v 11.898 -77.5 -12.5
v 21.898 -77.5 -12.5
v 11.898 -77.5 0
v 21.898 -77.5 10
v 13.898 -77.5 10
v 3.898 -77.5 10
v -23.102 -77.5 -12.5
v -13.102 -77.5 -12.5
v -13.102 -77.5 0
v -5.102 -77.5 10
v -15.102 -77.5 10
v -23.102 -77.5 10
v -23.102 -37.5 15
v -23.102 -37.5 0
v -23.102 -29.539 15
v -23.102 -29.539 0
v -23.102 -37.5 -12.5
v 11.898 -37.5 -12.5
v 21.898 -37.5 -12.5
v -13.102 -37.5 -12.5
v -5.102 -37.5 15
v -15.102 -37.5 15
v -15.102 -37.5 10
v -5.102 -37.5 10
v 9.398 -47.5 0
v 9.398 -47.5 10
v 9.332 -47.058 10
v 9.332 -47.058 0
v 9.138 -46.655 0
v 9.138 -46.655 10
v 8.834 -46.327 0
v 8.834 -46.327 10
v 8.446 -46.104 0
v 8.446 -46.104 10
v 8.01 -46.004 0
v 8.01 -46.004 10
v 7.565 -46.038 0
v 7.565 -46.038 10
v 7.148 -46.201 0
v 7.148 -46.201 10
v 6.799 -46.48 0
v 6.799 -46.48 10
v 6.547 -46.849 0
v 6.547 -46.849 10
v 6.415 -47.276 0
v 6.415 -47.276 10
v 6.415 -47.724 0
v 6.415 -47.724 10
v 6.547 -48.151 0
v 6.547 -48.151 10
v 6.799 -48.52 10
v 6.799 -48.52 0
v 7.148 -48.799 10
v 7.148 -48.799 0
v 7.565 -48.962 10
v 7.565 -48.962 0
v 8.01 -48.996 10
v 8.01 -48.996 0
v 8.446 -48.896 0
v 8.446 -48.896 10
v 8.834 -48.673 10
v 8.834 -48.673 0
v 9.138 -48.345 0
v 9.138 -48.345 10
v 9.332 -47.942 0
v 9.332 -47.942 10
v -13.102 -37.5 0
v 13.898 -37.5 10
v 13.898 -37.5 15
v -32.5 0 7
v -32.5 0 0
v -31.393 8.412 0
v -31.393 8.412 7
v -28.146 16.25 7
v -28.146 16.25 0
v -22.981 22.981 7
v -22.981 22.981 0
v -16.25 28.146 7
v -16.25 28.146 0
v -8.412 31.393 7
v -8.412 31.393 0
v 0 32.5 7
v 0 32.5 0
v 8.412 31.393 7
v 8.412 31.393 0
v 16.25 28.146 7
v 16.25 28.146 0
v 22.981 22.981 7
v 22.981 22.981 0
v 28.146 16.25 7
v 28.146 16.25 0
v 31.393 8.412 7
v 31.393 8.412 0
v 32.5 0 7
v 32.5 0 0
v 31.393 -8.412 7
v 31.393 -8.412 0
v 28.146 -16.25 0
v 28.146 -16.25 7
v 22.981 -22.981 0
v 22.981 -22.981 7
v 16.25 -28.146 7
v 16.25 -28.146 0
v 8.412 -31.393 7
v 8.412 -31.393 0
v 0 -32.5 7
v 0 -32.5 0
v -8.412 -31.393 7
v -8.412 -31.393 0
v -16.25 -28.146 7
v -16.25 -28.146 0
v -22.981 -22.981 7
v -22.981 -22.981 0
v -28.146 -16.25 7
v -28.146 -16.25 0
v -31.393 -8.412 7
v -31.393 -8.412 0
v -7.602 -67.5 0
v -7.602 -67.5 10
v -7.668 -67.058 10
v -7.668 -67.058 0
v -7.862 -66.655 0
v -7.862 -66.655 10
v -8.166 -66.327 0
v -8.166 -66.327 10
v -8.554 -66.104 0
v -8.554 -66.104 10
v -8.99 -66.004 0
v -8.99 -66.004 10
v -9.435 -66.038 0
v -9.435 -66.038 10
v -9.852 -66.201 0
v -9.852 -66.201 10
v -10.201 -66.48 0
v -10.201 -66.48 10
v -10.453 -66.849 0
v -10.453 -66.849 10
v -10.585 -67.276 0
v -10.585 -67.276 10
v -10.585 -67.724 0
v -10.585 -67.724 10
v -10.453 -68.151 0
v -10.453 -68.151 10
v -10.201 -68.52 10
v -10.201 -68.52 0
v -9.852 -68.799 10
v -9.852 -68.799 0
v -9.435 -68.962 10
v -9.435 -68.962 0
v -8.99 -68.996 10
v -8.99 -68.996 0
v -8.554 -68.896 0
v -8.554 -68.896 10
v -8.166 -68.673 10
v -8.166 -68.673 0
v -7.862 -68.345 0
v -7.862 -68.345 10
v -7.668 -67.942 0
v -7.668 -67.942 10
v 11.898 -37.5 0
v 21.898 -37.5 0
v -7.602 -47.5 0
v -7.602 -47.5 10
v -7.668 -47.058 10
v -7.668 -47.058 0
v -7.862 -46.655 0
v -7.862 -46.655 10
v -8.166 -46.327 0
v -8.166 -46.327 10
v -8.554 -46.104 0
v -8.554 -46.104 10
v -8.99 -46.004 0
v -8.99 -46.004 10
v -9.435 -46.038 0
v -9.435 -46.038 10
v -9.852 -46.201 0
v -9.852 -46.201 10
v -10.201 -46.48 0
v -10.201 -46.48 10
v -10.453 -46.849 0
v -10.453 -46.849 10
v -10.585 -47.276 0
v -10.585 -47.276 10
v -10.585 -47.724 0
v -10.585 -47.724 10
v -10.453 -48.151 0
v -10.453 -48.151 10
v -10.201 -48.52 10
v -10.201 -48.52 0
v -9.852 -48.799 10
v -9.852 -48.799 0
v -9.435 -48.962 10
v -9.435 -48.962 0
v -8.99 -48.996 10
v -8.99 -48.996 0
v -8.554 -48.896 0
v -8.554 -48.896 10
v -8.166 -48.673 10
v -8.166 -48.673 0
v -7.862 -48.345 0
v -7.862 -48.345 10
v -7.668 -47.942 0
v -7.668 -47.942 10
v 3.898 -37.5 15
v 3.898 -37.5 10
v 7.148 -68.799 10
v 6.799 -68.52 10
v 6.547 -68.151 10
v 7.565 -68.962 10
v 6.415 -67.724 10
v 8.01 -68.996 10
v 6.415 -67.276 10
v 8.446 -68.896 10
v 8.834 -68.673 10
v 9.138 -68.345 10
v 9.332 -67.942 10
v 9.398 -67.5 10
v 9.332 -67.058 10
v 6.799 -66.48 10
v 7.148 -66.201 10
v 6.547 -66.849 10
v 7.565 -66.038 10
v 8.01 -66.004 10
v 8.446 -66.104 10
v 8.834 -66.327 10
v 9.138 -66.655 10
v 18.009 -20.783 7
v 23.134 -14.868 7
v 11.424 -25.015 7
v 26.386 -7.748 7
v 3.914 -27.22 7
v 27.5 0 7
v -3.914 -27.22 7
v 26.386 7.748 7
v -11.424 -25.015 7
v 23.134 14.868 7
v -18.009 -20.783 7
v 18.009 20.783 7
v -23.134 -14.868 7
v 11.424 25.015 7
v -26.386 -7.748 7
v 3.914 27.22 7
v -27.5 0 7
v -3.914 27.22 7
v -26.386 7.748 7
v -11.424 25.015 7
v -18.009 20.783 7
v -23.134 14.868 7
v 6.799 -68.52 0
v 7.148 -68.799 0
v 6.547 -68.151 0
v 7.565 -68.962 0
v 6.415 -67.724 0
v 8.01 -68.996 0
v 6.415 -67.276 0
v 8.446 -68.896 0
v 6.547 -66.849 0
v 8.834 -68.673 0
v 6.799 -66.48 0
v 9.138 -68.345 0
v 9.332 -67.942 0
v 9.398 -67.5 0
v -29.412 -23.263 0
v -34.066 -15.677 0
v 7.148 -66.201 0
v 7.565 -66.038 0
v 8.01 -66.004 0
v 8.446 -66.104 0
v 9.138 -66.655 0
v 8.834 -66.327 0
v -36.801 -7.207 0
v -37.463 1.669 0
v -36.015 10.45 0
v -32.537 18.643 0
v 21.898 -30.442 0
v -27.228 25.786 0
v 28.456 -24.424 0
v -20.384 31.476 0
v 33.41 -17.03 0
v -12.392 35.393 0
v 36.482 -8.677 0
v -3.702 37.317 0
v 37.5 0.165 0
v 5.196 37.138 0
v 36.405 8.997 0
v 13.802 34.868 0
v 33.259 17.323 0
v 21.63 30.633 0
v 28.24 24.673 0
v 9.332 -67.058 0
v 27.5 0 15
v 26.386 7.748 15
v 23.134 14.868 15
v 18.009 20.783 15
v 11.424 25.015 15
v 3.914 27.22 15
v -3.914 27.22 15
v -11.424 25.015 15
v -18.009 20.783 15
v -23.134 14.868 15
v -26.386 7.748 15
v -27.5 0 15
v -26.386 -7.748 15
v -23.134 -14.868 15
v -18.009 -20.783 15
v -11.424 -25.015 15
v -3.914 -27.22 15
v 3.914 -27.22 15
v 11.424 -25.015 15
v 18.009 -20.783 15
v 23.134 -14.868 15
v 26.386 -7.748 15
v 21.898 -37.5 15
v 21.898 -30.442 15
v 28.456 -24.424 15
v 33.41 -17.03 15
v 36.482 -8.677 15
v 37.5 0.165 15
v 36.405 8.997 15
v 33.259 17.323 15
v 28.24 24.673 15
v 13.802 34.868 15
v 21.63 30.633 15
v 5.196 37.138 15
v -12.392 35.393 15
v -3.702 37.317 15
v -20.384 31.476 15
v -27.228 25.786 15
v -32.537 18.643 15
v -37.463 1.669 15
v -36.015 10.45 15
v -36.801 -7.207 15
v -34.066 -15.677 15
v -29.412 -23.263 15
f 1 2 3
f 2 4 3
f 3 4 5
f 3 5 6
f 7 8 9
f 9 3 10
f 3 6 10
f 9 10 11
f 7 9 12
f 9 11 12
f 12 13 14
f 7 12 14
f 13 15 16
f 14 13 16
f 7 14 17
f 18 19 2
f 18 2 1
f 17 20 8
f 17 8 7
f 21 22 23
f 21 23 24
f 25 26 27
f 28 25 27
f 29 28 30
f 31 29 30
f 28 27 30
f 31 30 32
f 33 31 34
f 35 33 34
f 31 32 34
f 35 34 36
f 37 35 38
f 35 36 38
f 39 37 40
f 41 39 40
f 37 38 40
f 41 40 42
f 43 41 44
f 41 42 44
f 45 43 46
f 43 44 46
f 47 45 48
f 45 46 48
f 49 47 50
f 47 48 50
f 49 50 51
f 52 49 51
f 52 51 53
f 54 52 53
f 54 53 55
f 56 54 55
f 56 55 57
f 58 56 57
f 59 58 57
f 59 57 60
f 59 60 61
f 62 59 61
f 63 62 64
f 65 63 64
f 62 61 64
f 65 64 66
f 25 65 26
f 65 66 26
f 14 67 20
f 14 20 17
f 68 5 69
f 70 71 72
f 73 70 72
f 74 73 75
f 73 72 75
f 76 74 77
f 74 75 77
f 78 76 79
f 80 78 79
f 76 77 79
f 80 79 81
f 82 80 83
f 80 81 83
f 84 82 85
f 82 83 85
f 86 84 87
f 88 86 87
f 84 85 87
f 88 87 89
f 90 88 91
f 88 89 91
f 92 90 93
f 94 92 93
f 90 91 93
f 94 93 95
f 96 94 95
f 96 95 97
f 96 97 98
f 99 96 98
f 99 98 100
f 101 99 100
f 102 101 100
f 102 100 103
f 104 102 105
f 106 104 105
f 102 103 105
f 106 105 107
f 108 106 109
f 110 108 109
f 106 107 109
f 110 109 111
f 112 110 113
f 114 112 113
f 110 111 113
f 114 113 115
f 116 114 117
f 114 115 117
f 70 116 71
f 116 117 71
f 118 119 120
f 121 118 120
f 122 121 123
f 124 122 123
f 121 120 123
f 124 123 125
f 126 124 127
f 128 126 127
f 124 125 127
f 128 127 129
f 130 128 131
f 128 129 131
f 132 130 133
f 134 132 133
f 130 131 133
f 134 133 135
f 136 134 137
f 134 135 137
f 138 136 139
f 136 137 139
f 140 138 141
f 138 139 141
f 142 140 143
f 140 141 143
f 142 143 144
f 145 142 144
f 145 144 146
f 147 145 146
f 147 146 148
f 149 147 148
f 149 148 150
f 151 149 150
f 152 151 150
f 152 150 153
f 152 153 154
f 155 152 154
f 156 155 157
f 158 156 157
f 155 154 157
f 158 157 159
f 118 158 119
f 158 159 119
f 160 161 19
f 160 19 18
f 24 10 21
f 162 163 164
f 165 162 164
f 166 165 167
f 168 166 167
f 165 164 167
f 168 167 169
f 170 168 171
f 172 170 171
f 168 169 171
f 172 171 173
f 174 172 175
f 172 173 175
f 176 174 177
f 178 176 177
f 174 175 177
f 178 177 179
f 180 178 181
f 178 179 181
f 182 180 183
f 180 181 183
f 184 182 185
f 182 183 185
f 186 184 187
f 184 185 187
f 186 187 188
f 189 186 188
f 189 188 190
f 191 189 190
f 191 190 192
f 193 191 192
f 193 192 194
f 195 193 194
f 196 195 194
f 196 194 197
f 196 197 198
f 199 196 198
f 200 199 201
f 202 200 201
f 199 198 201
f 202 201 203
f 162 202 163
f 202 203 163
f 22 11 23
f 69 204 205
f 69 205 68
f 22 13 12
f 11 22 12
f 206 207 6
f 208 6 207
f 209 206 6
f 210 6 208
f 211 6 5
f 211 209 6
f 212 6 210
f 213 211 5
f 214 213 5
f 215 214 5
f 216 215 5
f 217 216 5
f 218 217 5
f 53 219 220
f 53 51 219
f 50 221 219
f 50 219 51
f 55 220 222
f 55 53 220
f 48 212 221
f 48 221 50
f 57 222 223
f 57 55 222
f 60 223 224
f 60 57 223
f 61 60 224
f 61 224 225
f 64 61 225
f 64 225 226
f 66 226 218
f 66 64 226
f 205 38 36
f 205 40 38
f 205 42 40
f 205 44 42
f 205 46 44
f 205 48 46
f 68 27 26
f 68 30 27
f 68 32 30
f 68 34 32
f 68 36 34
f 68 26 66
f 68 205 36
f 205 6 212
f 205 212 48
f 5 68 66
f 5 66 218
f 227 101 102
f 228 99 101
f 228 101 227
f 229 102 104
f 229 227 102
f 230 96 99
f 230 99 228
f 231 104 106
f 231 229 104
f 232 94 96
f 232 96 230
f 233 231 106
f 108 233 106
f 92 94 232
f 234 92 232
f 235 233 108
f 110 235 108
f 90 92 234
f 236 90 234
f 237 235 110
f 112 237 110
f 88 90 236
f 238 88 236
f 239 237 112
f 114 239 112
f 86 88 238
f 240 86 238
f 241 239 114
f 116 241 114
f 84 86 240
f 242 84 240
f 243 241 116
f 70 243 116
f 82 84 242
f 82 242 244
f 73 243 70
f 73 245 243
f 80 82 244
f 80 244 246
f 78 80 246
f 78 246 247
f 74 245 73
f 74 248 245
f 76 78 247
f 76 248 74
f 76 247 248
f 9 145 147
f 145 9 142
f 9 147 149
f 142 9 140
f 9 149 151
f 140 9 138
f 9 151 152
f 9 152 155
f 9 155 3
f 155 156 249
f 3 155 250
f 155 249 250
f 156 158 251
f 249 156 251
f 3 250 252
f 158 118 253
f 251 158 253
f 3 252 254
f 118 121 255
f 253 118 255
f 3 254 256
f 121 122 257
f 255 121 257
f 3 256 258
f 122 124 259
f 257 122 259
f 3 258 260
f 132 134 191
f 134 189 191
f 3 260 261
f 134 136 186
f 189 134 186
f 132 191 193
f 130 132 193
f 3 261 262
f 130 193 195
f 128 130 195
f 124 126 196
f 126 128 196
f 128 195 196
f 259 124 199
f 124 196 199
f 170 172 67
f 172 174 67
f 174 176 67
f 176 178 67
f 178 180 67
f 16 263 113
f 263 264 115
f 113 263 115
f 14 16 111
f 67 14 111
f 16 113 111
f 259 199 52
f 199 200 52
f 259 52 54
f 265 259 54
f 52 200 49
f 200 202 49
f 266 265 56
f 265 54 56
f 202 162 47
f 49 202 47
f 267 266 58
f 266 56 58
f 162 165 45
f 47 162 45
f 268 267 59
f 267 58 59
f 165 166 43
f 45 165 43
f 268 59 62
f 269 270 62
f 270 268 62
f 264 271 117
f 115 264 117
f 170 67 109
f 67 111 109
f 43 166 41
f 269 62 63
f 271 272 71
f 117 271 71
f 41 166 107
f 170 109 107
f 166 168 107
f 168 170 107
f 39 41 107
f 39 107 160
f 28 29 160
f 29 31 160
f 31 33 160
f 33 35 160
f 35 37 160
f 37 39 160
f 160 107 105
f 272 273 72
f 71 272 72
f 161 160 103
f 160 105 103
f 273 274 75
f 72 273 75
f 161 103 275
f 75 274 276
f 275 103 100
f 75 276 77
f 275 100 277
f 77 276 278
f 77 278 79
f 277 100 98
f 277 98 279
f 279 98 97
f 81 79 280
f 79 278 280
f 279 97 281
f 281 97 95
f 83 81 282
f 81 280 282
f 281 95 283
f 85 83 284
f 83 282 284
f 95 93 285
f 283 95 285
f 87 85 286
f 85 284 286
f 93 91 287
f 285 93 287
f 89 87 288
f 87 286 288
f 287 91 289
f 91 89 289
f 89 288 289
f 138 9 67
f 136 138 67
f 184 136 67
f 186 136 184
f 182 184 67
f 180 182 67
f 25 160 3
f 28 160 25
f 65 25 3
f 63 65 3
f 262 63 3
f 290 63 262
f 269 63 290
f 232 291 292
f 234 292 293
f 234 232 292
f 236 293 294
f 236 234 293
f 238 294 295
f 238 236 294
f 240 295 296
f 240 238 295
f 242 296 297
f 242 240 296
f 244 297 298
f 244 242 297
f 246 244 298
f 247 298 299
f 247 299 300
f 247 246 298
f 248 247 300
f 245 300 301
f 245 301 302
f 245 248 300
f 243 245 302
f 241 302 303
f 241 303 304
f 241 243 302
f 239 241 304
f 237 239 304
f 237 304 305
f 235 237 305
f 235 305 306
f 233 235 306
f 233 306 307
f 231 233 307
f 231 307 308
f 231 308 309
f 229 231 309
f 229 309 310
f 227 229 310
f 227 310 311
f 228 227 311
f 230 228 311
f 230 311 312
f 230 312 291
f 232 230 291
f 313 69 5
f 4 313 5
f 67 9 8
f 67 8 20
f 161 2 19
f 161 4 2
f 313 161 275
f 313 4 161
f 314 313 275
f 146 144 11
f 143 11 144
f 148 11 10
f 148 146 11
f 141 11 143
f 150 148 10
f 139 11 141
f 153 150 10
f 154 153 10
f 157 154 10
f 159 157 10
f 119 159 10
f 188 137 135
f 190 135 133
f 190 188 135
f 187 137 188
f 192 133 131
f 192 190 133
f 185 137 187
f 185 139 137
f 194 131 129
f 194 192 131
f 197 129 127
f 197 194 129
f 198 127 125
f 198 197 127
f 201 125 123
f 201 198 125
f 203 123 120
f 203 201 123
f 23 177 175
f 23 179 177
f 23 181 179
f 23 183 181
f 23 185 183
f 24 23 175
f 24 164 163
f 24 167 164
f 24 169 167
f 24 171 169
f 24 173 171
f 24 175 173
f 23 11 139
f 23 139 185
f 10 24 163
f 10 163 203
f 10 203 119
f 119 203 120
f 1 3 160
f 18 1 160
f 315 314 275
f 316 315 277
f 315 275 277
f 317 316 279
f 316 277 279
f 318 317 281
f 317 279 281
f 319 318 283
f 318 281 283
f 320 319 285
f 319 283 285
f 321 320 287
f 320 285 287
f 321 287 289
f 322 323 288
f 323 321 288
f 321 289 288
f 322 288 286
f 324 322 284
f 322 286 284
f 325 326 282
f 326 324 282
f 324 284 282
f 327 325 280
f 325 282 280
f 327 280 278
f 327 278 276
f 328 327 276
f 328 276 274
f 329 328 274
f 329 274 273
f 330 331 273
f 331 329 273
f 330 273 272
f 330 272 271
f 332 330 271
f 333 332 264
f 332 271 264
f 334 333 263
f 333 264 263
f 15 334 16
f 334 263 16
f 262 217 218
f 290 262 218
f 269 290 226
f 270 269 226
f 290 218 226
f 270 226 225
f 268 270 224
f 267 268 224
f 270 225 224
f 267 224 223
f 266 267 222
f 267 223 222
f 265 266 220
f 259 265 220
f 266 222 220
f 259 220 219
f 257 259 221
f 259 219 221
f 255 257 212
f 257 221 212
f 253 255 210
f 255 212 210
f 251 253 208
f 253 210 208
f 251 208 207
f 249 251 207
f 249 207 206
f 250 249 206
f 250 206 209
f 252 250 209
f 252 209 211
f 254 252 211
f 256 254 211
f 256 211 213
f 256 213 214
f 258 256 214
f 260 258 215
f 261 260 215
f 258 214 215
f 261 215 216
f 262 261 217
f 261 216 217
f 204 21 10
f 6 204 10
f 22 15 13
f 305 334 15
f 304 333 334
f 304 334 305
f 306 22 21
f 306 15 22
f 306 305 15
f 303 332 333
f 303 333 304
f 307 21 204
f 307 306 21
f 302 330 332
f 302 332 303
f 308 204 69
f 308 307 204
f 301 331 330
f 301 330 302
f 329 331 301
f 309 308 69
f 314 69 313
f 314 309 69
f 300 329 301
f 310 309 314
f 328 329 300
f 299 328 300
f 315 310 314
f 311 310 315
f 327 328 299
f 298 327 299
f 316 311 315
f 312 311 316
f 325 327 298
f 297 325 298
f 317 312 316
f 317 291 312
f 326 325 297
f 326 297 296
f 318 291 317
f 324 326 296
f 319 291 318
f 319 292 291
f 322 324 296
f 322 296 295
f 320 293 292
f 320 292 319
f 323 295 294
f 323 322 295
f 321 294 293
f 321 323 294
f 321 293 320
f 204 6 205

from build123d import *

# Parameters (mm, degrees)
SKETCH1_R           = 27.5
BOSS_EXTRUDE1_DEPTH = 15
SKETCH2_R           = 32.5
SKETCH2_R_2         = 27.5
CUT_EXTRUDE1_DEPTH  = 7
SKETCH3_W           = 5
SKETCH3_H           = 40
CUT_EXTRUDE2_DEPTH  = 45
BOSS_EXTRUDE2_DEPTH = 45
SKETCH6_W           = 10
SKETCH6_H           = 40
CUT_EXTRUDE3_DEPTH  = 5
SKETCH7_W           = 10
SKETCH7_H           = 40
BOSS_EXTRUDE3_DEPTH = 12.5
SKETCH8_R           = 1.5
CUT_EXTRUDE4_DEPTH  = 10


with BuildPart() as part:
    # Sketch1 → Boss-Extrude1 (new body)
    with BuildSketch(Plane.XY):
        with BuildLine():
            Line((-23.101603537, -29.5392267), (-23.101603537, -77.5))
            Line((-23.101603537, -77.5), (21.898396463, -77.5))
            Line((21.898396463, -77.5), (21.898396463, -30.441915714))
            ThreePointArc((21.898396463, -30.441915714), (0.752089542, 37.492457392), (-23.101603537, -29.5392267))
        make_face()
        Circle(SKETCH1_R, mode=Mode.SUBTRACT)
    extrude(amount=BOSS_EXTRUDE1_DEPTH)

    # Sketch2 → Cut-Extrude1 (cut)
    with BuildSketch(Plane(origin=(0, 0, 0), x_dir=(-1, 0, 0), z_dir=(0, 0, -1))):
        Circle(SKETCH2_R)
        Circle(SKETCH2_R_2, mode=Mode.SUBTRACT)
    extrude(amount=-CUT_EXTRUDE1_DEPTH, mode=Mode.SUBTRACT)

    # Sketch3 → Cut-Extrude2 (cut)
    with BuildSketch(Plane(origin=(21.898396463, 0, 0), x_dir=(0, 0, -1), z_dir=(1, 0, 0))):
        with Locations((-12.5, -57.5)):
            Rectangle(SKETCH3_W, SKETCH3_H)
    extrude(amount=-CUT_EXTRUDE2_DEPTH, mode=Mode.SUBTRACT)

    # Sketch5 → Boss-Extrude2 (add)
    with BuildSketch(Plane.ZY.offset(23.101603537)):
        Polygon((10, -37.5), (15, -37.5), (10, -77.5), align=None)
    extrude(amount=-BOSS_EXTRUDE2_DEPTH)

    # Sketch6 → Cut-Extrude3 (cut)
    with BuildSketch(Plane.XY.offset(15)):
        with Locations((-10.101603537, -57.5)):
            Rectangle(SKETCH6_W, SKETCH6_H)
        with Locations((8.898396463, -57.5)):
            Rectangle(SKETCH6_W, SKETCH6_H)
    extrude(amount=-CUT_EXTRUDE3_DEPTH, mode=Mode.SUBTRACT)

    # Sketch7 → Boss-Extrude3 (add)
    with BuildSketch(Plane(origin=(0, 0, 0), x_dir=(-1, 0, 0), z_dir=(0, 0, -1))):
        with Locations((-16.898396463, -57.5)):
            Rectangle(SKETCH7_W, SKETCH7_H)
        with Locations((18.101603537, -57.5)):
            Rectangle(SKETCH7_W, SKETCH7_H)
    extrude(amount=BOSS_EXTRUDE3_DEPTH)

    # Sketch8 → Cut-Extrude4 (cut)
    with BuildSketch(Plane.XY.offset(10)):
        with Locations((-9.101603537, -47.5)):
            Circle(SKETCH8_R)
        with Locations((-9.101603537, -67.5)):
            Circle(SKETCH8_R)
        with Locations((7.898396463, -67.5)):
            Circle(SKETCH8_R)
        with Locations((7.898396463, -47.5)):
            Circle(SKETCH8_R)
    extrude(amount=-CUT_EXTRUDE4_DEPTH, mode=Mode.SUBTRACT)


solid = part.part
